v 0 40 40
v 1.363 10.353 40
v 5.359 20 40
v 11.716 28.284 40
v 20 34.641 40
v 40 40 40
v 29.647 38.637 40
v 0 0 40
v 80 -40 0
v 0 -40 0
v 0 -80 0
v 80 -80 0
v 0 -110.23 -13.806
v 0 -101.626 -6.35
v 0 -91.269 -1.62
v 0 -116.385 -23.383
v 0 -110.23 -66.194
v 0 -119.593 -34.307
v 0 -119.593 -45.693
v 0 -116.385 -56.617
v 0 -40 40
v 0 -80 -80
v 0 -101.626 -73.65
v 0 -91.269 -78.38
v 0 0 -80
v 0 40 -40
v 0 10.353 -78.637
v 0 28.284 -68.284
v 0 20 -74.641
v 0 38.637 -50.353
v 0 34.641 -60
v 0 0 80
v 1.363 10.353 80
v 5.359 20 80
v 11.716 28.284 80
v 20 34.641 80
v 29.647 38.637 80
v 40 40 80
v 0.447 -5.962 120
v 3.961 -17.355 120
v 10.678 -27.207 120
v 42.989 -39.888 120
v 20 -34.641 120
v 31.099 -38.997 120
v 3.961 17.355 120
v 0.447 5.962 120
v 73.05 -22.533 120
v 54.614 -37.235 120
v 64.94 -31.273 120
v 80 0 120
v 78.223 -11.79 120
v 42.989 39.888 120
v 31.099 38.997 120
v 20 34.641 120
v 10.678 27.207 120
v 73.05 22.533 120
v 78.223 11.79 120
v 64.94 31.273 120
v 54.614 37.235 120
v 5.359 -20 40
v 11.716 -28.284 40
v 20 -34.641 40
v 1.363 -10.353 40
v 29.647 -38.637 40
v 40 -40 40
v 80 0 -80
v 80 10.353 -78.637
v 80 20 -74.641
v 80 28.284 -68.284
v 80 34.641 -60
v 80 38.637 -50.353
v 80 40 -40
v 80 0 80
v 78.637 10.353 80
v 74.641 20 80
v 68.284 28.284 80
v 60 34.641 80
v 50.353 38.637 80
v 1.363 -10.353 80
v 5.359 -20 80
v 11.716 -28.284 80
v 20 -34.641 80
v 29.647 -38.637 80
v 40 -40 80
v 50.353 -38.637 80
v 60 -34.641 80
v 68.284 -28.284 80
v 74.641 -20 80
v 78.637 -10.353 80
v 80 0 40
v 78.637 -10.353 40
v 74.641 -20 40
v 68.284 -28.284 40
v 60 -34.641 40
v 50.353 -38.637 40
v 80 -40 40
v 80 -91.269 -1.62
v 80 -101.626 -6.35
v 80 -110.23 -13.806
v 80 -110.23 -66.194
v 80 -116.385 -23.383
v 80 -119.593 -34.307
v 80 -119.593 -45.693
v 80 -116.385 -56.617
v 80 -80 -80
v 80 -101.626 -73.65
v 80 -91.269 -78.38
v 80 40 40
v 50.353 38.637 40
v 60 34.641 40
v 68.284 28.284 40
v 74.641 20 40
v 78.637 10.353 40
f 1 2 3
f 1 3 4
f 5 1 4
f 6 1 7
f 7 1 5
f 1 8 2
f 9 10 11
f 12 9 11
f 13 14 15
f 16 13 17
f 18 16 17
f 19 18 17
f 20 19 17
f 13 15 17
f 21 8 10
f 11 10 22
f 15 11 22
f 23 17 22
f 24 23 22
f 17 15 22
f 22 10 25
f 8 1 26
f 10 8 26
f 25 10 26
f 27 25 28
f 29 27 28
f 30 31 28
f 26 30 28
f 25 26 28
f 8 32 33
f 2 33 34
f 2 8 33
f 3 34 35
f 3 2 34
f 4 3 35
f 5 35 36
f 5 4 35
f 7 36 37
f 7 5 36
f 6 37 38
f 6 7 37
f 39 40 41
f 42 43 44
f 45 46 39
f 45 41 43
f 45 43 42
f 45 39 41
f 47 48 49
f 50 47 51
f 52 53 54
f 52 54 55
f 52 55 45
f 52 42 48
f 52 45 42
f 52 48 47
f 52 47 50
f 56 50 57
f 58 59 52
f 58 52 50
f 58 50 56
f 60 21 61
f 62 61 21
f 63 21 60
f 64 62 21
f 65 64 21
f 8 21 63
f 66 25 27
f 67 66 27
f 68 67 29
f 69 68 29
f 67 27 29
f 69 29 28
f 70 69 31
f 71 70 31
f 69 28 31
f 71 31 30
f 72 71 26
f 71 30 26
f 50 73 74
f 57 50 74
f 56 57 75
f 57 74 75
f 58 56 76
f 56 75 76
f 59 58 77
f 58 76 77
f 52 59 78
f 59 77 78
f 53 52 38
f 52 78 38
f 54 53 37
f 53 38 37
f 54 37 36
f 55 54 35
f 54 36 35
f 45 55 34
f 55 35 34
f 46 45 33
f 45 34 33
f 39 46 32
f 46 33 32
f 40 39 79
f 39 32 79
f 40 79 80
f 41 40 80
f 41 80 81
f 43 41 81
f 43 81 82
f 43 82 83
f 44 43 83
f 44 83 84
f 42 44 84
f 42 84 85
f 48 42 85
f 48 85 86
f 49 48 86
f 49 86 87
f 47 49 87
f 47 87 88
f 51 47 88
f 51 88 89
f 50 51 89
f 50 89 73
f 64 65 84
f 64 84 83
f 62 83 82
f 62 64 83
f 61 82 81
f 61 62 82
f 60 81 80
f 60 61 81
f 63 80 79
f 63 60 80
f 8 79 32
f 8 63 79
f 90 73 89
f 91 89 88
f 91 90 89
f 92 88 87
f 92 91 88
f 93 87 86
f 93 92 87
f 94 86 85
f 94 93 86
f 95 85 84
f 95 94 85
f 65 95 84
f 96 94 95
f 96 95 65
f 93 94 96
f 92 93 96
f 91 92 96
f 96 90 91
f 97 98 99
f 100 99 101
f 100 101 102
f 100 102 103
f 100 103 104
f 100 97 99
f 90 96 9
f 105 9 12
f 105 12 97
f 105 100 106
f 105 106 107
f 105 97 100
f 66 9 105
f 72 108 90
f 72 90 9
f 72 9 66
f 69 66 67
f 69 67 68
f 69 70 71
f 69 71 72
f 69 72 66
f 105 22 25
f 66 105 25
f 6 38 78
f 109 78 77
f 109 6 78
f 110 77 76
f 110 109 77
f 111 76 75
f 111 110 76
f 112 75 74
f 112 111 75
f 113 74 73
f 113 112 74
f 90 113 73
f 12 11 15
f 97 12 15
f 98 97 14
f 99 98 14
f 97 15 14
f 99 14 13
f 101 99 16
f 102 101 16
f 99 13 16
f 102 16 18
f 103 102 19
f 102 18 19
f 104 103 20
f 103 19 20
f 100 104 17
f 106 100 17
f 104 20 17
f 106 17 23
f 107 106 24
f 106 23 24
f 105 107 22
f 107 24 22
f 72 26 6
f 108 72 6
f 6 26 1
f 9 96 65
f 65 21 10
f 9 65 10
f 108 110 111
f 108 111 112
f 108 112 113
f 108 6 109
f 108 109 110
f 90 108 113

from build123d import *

# Parameters (mm, degrees)
BOSS_EXTRUDE1_DEPTH = 80
SKETCH3_R           = 40
BOSS_EXTRUDE2_DEPTH = 40
CUT_EXTRUDE3_START  = -40
CUT_EXTRUDE3_DEPTH  = 40


with BuildPart() as part:
    # Sketch2 → Boss-Extrude1 (new body)
    with BuildSketch(Plane(origin=(0, 0, 0), x_dir=(0, 0, -1), z_dir=(1, 0, 0))):
        with BuildLine():
            Line((-80, -40), (0, -40))
            Line((0, -40), (0, -80))
            ThreePointArc((0, -80), (40, -120), (80, -80))
            Line((80, -80), (80, -40))
            Line((80, -40), (80, 0))
            ThreePointArc((80, 0), (68.284271247, 28.284271247), (40, 40))
            Line((40, 40), (-80, 40))
            Line((-80, 40), (-80, -40))
        make_face()
    extrude(amount=BOSS_EXTRUDE1_DEPTH)

    # Sketch3 → Boss-Extrude2 (add)
    with BuildSketch(Plane.XY.offset(80)):
        with Locations((40, 0)):
            Circle(SKETCH3_R)
    extrude(amount=BOSS_EXTRUDE2_DEPTH)

    # Sketch5 → Cut-Extrude3 (cut)
    with BuildSketch(Plane.XY.offset(80).offset(CUT_EXTRUDE3_START)):
        with BuildLine():
            Line((40, 40), (0, 40))
            Line((0, 40), (0, 0))
            ThreePointArc((0, 0), (11.715728753, 28.284271247), (40, 40))
        make_face()
        with BuildLine():
            Line((80, 40), (40, 40))
            ThreePointArc((40, 40), (68.284271247, 28.284271247), (80, 0))
            Line((80, 0), (80, 40))
        make_face()
        with BuildLine():
            ThreePointArc((40, -40), (11.715728753, -28.284271247), (0, 0))
            Line((0, 0), (0, -40))
            Line((0, -40), (40, -40))
        make_face()
        with BuildLine():
            Line((80, -40), (80, 0))
            ThreePointArc((80, 0), (68.284271247, -28.284271247), (40, -40))
            Line((40, -40), (80, -40))
        make_face()
    extrude(amount=CUT_EXTRUDE3_DEPTH, mode=Mode.SUBTRACT)


solid = part.part
